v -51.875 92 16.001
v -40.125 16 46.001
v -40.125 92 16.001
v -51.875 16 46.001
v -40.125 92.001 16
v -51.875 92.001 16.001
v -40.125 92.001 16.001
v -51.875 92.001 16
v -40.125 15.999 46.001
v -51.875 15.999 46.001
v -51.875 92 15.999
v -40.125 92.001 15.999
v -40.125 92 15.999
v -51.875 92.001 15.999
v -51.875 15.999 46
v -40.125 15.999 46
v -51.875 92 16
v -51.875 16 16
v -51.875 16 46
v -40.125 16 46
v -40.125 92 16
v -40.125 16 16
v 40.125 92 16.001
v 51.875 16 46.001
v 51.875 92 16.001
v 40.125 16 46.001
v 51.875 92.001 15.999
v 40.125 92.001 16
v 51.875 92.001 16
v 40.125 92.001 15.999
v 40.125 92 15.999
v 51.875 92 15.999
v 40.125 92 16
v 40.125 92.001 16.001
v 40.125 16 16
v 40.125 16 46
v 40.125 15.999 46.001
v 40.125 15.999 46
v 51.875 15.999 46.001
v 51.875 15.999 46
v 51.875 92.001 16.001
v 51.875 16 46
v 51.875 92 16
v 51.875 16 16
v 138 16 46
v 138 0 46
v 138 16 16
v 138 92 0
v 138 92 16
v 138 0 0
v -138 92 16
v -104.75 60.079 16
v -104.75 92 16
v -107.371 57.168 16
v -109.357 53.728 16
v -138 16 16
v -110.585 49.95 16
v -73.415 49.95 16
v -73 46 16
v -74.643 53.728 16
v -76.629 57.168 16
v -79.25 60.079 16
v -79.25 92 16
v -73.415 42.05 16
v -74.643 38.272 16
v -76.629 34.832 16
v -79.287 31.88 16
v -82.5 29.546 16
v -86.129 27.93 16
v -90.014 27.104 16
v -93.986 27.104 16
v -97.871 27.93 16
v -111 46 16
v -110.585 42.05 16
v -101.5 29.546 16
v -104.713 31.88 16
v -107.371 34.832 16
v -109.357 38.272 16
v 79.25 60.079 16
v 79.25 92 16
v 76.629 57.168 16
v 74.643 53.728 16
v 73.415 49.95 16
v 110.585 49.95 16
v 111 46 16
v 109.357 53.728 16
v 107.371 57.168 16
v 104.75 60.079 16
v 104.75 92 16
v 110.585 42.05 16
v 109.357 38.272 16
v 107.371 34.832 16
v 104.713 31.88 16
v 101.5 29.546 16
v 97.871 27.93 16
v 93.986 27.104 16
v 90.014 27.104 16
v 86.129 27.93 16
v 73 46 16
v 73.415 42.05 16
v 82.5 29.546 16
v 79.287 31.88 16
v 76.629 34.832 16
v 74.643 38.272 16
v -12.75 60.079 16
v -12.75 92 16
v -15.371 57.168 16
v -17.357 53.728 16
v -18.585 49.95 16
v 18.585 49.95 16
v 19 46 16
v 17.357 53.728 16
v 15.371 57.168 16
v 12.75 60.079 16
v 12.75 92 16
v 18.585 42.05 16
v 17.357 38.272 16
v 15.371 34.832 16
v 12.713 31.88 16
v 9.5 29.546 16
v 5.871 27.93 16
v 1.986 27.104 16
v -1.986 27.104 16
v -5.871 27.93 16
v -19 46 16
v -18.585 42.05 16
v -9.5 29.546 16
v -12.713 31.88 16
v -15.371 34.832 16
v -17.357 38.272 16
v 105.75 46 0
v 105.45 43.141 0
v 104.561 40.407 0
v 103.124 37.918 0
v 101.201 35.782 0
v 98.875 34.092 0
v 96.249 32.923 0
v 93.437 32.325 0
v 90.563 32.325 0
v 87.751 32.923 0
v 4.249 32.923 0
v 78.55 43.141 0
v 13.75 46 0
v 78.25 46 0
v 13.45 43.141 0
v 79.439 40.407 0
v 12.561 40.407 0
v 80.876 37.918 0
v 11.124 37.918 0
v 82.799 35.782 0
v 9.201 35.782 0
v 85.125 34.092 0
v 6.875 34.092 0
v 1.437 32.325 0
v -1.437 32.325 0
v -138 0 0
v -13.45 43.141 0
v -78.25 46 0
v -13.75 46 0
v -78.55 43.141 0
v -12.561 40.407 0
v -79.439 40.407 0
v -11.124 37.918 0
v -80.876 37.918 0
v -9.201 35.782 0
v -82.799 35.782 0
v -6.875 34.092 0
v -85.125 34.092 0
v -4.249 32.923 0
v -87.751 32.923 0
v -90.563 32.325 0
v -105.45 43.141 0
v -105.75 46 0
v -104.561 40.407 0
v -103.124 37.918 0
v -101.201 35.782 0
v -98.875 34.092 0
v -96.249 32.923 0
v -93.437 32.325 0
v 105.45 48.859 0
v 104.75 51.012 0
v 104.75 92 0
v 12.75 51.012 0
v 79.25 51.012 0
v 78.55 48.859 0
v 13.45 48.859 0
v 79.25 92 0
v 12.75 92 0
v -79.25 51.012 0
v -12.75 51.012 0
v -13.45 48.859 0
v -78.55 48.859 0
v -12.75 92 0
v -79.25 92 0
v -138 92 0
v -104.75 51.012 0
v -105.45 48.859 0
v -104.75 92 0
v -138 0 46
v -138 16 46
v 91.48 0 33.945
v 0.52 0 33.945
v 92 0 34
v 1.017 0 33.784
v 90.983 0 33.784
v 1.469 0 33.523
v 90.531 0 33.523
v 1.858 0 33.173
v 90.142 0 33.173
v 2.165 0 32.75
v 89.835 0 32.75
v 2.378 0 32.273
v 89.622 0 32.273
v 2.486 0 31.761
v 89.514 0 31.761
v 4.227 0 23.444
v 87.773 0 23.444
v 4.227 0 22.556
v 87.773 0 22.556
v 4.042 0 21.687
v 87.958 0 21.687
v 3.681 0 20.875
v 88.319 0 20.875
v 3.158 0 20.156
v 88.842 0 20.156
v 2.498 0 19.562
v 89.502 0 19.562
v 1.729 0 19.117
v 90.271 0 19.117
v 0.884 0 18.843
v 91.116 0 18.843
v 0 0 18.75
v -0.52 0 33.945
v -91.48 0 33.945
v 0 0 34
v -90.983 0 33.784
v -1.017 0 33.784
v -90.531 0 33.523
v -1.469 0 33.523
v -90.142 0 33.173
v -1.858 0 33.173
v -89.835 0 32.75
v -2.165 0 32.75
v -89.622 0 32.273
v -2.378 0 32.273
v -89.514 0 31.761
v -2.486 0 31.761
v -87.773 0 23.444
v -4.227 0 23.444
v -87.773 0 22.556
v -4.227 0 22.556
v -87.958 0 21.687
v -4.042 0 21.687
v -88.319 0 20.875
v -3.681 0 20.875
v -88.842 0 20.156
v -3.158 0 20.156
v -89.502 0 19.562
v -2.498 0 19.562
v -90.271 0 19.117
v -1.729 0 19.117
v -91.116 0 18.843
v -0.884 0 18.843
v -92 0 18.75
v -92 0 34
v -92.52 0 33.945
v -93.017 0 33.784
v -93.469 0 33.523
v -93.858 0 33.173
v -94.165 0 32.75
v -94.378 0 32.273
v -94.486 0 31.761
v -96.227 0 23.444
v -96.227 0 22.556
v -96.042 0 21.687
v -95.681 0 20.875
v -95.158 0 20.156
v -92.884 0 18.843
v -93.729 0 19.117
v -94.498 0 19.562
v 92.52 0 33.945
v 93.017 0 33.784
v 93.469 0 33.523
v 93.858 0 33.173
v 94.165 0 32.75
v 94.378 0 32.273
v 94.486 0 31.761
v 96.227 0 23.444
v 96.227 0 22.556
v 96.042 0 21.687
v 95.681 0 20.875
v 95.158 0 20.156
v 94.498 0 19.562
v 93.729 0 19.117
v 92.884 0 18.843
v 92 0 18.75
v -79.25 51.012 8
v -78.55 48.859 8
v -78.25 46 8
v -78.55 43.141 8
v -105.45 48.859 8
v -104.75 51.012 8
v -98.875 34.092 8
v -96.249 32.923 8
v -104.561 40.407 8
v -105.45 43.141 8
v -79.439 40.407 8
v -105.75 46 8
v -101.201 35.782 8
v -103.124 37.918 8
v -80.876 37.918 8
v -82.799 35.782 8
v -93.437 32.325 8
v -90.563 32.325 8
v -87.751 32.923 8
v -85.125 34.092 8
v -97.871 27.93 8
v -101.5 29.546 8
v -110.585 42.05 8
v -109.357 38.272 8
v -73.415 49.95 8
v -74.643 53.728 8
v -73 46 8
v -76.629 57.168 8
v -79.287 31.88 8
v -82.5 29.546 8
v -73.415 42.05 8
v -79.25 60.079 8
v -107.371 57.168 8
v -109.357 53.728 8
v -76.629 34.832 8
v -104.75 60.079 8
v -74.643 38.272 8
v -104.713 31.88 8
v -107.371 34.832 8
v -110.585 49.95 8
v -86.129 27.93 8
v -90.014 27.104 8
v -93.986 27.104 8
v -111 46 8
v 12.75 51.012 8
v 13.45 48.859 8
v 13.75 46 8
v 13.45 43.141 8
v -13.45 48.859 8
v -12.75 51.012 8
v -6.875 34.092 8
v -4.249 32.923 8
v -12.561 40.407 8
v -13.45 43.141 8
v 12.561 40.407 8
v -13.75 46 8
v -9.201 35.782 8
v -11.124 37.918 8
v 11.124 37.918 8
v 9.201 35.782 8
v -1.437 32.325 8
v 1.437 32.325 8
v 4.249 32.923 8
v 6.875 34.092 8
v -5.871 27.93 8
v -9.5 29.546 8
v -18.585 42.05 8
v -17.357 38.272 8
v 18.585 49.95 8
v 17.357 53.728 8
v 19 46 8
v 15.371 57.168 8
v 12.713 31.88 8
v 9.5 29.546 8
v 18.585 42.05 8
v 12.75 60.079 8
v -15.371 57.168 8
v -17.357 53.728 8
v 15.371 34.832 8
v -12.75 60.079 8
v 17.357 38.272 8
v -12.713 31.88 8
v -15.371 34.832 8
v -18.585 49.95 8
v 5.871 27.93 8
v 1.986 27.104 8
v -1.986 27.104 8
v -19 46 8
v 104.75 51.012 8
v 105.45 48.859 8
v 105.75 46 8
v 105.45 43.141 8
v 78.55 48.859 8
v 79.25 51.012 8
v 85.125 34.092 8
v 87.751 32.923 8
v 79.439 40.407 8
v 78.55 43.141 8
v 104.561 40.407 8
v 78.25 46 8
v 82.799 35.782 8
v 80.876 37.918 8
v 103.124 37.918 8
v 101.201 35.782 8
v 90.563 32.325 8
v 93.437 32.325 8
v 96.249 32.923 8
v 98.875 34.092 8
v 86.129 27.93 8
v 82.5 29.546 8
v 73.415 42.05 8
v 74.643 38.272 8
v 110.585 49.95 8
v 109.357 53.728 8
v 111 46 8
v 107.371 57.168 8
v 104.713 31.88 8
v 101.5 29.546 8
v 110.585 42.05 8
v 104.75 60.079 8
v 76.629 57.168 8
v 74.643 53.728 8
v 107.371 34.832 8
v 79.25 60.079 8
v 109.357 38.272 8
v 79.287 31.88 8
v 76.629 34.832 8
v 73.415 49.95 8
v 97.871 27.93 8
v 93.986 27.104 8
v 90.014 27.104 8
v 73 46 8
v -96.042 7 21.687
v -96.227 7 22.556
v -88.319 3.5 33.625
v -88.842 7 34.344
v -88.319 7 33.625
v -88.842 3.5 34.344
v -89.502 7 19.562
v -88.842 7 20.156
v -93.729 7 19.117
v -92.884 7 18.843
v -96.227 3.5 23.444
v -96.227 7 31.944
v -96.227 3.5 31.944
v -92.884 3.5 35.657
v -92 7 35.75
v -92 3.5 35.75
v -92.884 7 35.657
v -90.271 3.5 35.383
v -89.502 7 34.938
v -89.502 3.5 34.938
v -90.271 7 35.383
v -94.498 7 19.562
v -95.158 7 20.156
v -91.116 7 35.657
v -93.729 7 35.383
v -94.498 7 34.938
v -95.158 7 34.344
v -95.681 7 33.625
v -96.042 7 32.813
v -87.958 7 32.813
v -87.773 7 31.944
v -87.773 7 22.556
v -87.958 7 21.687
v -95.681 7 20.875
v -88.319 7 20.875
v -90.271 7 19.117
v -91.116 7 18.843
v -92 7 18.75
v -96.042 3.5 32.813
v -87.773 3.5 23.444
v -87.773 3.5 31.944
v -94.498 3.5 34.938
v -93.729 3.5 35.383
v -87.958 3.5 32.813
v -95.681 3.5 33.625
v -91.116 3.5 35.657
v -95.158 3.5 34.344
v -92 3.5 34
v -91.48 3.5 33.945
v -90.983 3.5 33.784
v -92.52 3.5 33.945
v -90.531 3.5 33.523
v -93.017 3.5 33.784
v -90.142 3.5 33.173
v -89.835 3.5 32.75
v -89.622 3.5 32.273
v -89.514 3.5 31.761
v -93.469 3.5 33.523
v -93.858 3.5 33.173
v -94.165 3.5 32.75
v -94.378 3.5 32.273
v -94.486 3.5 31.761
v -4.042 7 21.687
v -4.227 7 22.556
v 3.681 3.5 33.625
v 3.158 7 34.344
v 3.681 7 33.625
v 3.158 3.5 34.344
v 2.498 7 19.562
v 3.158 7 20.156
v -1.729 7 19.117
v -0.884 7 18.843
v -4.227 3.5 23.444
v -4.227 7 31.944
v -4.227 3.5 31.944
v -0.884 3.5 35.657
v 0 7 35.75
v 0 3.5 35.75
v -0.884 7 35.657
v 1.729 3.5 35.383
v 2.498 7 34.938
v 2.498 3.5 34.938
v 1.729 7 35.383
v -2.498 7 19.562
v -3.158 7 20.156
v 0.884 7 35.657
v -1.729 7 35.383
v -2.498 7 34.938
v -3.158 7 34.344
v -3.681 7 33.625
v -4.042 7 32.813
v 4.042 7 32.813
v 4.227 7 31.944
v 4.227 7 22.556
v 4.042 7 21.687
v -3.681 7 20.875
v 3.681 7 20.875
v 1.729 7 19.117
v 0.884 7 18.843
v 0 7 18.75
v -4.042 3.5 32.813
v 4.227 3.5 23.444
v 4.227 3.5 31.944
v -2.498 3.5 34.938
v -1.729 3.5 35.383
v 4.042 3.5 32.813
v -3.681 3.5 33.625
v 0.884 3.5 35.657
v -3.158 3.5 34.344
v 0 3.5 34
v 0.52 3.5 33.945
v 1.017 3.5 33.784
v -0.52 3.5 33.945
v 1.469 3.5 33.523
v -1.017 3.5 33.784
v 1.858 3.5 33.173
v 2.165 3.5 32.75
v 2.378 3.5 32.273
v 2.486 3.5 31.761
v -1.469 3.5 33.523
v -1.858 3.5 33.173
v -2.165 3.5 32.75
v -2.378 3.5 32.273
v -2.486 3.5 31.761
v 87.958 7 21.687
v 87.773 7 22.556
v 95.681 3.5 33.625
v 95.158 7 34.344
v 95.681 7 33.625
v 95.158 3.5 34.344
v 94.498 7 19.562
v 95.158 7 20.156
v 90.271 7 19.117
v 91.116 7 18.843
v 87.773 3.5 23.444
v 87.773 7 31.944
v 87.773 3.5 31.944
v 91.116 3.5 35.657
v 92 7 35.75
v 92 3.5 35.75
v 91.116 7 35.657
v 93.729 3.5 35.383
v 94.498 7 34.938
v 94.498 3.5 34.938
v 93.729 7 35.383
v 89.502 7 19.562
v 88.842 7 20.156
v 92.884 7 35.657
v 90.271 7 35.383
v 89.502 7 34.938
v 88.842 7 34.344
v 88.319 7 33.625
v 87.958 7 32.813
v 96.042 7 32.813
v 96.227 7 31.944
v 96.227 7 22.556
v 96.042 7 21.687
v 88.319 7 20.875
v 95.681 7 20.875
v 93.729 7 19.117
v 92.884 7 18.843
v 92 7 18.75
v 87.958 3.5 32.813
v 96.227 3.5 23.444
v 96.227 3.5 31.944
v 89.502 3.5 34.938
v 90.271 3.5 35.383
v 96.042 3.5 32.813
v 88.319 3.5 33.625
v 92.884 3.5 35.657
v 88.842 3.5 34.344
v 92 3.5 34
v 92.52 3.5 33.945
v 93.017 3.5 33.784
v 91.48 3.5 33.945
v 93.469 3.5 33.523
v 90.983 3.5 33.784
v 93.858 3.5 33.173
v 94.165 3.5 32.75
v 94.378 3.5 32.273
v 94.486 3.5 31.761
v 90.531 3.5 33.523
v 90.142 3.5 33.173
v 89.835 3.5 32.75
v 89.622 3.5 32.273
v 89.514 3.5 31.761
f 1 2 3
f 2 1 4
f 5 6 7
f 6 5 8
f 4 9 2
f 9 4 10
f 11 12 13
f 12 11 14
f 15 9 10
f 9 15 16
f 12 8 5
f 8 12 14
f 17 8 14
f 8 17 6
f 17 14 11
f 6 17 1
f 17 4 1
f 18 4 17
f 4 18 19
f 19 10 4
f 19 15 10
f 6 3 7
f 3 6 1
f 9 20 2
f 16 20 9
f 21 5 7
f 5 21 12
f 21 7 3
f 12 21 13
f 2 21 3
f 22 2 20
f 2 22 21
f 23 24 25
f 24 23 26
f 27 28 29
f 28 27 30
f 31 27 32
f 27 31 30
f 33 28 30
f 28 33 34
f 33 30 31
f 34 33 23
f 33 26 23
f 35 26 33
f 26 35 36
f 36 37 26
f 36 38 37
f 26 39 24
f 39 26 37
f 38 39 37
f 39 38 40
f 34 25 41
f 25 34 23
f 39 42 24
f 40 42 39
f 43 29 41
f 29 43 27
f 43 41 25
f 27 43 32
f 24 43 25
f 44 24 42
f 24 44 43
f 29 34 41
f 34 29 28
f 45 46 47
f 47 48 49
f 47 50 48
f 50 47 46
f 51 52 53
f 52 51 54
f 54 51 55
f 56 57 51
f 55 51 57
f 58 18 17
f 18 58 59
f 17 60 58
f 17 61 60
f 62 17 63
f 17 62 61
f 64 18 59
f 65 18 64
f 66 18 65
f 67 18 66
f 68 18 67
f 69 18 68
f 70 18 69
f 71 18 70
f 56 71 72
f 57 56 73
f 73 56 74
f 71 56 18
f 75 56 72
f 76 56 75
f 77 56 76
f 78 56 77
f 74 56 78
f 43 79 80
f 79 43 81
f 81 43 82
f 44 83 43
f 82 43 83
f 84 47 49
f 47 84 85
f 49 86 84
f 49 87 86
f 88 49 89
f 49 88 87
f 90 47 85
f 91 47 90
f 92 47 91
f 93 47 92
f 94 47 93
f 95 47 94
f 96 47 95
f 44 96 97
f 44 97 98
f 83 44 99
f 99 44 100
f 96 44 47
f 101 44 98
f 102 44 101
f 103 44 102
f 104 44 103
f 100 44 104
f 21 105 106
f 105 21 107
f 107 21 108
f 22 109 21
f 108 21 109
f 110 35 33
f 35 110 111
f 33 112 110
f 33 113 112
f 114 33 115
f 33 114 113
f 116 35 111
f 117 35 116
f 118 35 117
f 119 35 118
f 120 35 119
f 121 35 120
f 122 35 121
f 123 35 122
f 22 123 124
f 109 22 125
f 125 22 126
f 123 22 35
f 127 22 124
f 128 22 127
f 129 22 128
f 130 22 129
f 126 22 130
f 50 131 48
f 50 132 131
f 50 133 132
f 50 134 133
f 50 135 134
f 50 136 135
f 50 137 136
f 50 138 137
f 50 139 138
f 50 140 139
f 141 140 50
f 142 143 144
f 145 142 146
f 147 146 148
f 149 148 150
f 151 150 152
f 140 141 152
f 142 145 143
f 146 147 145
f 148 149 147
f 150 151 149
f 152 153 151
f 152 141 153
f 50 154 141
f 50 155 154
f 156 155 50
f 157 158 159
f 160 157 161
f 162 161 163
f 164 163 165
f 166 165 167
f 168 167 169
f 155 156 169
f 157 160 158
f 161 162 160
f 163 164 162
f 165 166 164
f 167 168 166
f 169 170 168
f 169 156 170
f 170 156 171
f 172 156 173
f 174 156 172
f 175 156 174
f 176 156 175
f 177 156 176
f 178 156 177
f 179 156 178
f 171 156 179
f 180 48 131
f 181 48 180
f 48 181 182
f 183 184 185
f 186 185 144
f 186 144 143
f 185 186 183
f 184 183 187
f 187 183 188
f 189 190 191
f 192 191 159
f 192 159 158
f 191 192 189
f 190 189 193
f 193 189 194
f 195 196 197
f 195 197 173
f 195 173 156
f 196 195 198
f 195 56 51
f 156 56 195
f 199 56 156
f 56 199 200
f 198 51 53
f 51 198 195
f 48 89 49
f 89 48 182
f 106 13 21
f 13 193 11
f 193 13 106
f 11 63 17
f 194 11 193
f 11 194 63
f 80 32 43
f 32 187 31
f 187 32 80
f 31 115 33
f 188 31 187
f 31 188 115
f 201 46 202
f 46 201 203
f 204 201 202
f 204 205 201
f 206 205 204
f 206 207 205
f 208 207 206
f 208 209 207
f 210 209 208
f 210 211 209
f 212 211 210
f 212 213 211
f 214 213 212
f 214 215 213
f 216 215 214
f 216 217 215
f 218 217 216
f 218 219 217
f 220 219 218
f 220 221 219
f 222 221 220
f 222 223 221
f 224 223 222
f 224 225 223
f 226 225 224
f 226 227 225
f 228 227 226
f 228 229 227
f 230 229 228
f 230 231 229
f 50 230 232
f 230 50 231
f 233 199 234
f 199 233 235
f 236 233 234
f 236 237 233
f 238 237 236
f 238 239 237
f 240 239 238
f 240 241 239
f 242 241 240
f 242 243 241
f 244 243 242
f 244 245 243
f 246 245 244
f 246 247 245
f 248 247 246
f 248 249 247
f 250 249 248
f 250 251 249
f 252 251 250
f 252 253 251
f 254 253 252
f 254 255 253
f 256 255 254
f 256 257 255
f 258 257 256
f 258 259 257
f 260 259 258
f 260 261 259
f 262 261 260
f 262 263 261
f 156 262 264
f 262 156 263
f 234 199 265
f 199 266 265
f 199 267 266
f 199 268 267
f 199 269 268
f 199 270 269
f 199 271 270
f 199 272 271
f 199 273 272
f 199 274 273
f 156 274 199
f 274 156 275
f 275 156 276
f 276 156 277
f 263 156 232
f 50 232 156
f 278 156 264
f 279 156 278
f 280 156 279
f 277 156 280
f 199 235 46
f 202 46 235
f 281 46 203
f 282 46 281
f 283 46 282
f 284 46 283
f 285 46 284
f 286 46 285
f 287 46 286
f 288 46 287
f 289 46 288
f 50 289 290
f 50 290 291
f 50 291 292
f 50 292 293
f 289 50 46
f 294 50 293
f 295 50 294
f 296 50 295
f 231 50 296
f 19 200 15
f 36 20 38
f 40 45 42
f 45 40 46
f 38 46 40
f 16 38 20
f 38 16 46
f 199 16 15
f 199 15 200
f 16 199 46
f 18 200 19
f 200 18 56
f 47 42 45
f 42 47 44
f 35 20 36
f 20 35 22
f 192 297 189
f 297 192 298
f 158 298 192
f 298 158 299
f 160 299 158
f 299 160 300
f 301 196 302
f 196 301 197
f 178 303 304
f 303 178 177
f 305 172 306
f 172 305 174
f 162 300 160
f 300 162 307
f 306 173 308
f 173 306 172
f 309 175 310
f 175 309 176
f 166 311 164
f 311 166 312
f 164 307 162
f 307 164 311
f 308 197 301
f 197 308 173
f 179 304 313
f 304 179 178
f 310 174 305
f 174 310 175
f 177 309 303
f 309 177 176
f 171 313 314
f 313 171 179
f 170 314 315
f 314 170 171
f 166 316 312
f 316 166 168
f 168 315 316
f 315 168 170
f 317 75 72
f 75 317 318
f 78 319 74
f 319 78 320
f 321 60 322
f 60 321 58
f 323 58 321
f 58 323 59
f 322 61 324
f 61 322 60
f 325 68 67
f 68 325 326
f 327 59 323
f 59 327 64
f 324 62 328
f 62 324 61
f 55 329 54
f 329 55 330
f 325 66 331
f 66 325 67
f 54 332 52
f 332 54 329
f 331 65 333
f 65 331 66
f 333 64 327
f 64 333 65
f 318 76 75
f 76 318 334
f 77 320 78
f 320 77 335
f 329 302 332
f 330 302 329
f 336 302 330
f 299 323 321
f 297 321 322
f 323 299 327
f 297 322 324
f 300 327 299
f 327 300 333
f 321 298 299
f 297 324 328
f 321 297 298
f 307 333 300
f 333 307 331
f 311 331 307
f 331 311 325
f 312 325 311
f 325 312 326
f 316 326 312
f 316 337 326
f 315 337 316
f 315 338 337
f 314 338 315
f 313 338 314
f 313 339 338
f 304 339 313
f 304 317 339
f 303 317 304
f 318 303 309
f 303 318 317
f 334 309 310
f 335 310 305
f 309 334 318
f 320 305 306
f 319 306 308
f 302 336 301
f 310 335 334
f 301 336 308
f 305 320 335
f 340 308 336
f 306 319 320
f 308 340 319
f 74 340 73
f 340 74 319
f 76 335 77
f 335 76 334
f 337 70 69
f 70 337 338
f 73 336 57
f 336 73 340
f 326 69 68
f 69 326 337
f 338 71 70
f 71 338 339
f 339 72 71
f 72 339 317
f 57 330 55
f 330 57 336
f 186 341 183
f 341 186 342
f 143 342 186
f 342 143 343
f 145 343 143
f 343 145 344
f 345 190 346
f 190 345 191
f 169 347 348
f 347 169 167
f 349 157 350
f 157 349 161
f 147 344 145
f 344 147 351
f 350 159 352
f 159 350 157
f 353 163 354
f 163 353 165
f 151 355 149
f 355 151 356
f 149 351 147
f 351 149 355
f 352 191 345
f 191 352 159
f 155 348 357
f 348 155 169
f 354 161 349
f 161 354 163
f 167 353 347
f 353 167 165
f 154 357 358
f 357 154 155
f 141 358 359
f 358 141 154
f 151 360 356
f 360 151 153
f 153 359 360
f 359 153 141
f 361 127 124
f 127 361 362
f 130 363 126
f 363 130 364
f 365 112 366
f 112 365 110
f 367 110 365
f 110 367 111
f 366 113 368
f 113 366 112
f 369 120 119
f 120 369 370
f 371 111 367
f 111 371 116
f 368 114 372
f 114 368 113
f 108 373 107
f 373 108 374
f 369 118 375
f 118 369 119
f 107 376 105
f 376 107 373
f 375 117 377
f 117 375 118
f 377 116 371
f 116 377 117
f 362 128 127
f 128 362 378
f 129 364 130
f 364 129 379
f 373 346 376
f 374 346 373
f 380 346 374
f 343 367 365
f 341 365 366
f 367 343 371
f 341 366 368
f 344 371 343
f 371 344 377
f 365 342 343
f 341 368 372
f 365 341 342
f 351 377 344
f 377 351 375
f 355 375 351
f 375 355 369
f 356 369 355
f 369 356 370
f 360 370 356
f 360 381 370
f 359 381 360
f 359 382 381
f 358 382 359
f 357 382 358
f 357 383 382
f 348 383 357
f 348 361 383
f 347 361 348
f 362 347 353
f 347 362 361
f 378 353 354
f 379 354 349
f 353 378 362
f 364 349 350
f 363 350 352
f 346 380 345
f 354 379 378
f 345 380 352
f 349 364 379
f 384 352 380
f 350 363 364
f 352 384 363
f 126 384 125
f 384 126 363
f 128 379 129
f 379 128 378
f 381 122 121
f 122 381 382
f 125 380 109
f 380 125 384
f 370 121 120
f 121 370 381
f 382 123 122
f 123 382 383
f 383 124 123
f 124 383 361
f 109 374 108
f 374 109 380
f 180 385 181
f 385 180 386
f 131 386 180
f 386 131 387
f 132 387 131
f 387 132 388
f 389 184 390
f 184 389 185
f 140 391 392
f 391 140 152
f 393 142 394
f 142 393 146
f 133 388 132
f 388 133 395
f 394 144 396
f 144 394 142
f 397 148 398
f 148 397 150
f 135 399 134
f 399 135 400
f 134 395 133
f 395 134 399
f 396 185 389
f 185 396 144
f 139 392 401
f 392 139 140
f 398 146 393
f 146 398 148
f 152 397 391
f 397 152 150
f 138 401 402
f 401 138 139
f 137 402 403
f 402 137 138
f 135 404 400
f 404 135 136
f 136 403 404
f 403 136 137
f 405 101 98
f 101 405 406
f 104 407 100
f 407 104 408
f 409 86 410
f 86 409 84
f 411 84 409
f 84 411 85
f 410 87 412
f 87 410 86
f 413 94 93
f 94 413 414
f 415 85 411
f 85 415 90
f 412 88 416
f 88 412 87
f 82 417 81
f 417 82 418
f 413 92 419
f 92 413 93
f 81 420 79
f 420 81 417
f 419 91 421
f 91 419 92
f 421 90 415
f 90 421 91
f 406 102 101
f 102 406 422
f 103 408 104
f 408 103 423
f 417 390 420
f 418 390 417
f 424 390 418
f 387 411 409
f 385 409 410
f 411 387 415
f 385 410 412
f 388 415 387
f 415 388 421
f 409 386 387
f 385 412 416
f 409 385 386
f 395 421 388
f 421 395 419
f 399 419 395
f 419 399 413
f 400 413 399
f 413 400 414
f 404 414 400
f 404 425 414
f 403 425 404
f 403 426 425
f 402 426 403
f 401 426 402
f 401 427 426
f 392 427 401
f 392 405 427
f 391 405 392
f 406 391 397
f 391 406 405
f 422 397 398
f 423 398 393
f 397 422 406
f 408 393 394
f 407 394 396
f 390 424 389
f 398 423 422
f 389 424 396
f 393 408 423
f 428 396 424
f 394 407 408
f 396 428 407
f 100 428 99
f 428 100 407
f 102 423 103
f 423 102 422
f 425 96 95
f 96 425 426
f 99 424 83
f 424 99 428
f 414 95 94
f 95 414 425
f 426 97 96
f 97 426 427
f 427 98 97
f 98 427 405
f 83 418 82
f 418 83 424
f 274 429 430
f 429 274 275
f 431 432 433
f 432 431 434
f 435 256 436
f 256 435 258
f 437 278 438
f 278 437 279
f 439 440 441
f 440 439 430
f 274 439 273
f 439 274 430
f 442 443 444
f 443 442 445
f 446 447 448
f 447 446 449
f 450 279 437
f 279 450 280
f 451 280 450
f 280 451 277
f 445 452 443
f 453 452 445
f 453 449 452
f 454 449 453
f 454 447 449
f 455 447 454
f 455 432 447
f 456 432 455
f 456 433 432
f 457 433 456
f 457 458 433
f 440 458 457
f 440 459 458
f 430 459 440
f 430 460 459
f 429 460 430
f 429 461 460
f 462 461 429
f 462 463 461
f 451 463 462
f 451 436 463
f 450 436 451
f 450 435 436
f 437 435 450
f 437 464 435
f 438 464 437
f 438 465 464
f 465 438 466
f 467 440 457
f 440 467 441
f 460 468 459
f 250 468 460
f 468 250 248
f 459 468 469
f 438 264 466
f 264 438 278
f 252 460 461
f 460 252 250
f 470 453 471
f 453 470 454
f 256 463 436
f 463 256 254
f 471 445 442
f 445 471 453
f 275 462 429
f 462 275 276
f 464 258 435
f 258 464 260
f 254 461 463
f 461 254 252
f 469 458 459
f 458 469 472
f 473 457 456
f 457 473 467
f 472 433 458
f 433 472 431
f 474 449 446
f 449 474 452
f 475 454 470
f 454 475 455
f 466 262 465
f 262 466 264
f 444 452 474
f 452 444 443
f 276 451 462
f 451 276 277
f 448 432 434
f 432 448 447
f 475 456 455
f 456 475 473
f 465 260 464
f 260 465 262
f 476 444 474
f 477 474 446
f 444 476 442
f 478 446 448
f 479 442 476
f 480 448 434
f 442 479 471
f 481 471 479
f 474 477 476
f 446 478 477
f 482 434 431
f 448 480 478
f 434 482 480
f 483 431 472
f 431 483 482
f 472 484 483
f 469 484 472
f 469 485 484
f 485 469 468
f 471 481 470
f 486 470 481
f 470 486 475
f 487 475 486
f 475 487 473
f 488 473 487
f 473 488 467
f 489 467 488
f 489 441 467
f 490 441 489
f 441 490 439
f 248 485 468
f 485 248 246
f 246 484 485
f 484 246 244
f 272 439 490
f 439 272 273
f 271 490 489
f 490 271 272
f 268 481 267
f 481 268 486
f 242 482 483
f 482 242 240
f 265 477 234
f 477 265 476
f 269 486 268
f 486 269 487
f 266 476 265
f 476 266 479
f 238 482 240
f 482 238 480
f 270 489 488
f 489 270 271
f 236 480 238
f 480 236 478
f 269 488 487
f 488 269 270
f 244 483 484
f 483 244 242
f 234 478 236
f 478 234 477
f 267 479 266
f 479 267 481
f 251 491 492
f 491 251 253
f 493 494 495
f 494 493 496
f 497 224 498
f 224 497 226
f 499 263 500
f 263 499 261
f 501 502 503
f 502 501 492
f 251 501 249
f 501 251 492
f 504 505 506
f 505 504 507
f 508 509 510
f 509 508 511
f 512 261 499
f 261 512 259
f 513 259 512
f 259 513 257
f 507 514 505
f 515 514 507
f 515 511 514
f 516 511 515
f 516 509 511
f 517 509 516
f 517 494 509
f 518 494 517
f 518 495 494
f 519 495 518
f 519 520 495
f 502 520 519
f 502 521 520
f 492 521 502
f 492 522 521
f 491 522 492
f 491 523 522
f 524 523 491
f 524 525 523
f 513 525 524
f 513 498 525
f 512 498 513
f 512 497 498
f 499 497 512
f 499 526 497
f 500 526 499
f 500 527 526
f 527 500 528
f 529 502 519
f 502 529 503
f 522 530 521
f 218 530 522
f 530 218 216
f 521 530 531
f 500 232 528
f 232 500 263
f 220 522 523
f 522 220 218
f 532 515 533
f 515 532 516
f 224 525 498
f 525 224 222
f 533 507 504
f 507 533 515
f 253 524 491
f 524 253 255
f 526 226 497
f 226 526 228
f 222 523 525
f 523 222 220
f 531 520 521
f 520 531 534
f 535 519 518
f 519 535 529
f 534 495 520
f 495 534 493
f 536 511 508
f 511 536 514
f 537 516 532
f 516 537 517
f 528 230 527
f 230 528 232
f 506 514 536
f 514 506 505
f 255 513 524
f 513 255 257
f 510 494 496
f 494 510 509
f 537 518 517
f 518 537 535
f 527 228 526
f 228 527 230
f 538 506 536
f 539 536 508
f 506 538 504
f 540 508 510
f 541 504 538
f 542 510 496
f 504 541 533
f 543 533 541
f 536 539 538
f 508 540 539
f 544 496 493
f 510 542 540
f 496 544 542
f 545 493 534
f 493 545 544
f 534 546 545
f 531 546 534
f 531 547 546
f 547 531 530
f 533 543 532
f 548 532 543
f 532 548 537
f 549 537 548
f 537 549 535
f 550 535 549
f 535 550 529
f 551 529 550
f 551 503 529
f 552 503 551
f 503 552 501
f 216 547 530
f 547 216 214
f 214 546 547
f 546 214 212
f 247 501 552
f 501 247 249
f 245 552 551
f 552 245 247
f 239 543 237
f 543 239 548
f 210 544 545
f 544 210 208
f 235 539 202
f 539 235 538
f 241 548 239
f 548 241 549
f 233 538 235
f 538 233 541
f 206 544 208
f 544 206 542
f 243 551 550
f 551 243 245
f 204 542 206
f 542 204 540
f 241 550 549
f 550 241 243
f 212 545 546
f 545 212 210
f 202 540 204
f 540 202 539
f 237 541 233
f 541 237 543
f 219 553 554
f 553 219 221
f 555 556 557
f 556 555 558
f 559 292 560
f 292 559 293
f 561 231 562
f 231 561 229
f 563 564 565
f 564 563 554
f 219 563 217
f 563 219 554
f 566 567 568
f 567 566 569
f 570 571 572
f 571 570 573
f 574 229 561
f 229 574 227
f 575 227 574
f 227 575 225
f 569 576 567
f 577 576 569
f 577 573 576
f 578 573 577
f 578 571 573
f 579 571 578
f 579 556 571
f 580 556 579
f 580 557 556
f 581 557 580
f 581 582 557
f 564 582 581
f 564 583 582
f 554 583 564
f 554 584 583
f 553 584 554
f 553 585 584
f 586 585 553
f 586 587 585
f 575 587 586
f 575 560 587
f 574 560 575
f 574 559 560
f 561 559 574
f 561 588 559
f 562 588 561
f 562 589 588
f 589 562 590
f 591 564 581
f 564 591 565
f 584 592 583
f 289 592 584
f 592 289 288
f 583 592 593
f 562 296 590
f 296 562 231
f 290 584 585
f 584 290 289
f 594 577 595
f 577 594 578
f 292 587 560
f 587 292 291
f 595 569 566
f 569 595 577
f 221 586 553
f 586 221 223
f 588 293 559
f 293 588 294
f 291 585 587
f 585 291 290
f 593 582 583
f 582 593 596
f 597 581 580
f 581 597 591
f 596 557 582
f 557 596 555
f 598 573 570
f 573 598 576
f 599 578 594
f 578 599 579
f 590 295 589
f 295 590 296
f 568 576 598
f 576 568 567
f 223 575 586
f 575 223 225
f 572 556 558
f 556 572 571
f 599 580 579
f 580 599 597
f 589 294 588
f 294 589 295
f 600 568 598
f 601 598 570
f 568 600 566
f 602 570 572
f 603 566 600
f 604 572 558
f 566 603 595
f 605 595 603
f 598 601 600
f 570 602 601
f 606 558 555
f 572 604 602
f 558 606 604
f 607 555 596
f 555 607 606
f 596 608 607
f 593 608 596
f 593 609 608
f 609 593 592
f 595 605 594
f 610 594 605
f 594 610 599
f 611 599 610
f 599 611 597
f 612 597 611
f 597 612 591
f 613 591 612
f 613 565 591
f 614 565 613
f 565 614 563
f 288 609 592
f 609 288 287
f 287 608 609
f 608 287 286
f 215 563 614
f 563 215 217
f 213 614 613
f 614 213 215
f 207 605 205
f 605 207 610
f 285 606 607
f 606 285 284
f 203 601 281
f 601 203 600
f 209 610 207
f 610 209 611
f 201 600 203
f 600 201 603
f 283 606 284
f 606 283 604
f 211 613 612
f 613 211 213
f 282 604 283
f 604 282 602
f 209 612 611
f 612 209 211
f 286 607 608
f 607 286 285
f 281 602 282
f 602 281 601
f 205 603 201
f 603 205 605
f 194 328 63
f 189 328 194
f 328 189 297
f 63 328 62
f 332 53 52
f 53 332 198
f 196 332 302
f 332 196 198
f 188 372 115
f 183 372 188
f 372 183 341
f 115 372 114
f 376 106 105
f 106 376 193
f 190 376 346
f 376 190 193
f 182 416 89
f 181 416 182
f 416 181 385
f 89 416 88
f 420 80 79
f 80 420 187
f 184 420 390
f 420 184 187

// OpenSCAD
//How many slots wide do you want
clubs_wide = 3; //[1:1:9]
//How many clubs fit in one slots
clubs_thick = 1; //[1:1:2]
//What is the diameter of the bulb on your club
bulb_diameter = 92; //[60:.5:100]
//How thick is the handle near the knob
handle_diameter = 23.5; //[5:.5:40]
//How thick the knob on your clubs are
knob_diameter = 34; //[20:.5:40]
//How thick do you want the bracket to be (16mm recomended)
bracket_thickness = 16; //[10:.5:40]
$fn = 30;

//Mounting (add some a couple millimeters to ensure an easy fit)
screw_head_diameter = 8.5; //[1:.5:10]
screw_head_Thickness = 3.5; //[1:.25:10]
screw_diameter = 5; //[1:.25:10]

module bracket(){
  translate([-(bulb_diameter*clubs_wide)/2,0,0])
    difference(){
      union(){
        cube([bulb_diameter*clubs_wide,bulb_diameter*clubs_thick,bracket_thickness]);
        translate([0,0,bracket_thickness])
          cube([bulb_diameter*clubs_wide,bracket_thickness,(bulb_diameter/2)-bracket_thickness]);
        for(h = [0:bulb_diameter:bulb_diameter*(clubs_wide-2)])
          translate([bulb_diameter+h,bracket_thickness,bracket_thickness])
            support();
      }
      //cuts out the holes that the clubs fit in
      union(){
        for(i = [0:bulb_diameter:bulb_diameter*(clubs_thick-1)])
          for(j = [0:bulb_diameter:bulb_diameter*(clubs_wide-1)])
            translate([bulb_diameter/2+j,bulb_diameter/2+i,0])
              union(){
                cylinder(r = handle_diameter/2+2, h = bracket_thickness+.1);
                translate([0,0,bracket_thickness/2])
                  cylinder(r = knob_diameter/2+2, h = bracket_thickness/2+.1);
              }
        //cuts the slots so the clubs can slide in
        for(k = [0:bulb_diameter:bulb_diameter*(clubs_wide-1)]){
          translate([bulb_diameter/2+k,bulb_diameter/2+(bulb_diameter*clubs_thick)/2,bracket_thickness/2])
            cube([handle_diameter+2,bulb_diameter*clubs_thick,bracket_thickness+.1],center = true);
        translate([k,0,0])
          mountingHoles();
        }
      }
    }
}
//generates triangle supports
module support(){
  cylinderRadius = .001;
  rotate([0,90,0]) hull(){
    cylinder(r = cylinderRadius, h = handle_diameter/2, center = true);
    translate([-(bulb_diameter/2-bracket_thickness),0,0])
      cylinder(r = cylinderRadius, h = handle_diameter/2, center = true);
    translate([0,(bulb_diameter*clubs_thick)-bracket_thickness,0])
      cylinder(r = cylinderRadius, h = handle_diameter/2, center = true);
  }
}
module mountingHoles(){
  translate([bulb_diameter/2,screw_head_Thickness*2,bulb_diameter/4]) rotate([0,-90,90]){
    hull(){
      cylinder(r = screw_head_diameter/2, h = screw_head_Thickness);
      translate([screw_head_diameter,0,0])
        cylinder(r = screw_head_diameter/2, h = screw_head_Thickness);
    }
    translate([0,0,screw_head_Thickness]) hull(){
      cylinder(r = screw_head_diameter/2, h = screw_head_Thickness+1);
      translate([screw_head_diameter,0,0])
        cylinder(r = screw_diameter/2, h = screw_head_Thickness+1);
    }
  }

}

  bracket();
